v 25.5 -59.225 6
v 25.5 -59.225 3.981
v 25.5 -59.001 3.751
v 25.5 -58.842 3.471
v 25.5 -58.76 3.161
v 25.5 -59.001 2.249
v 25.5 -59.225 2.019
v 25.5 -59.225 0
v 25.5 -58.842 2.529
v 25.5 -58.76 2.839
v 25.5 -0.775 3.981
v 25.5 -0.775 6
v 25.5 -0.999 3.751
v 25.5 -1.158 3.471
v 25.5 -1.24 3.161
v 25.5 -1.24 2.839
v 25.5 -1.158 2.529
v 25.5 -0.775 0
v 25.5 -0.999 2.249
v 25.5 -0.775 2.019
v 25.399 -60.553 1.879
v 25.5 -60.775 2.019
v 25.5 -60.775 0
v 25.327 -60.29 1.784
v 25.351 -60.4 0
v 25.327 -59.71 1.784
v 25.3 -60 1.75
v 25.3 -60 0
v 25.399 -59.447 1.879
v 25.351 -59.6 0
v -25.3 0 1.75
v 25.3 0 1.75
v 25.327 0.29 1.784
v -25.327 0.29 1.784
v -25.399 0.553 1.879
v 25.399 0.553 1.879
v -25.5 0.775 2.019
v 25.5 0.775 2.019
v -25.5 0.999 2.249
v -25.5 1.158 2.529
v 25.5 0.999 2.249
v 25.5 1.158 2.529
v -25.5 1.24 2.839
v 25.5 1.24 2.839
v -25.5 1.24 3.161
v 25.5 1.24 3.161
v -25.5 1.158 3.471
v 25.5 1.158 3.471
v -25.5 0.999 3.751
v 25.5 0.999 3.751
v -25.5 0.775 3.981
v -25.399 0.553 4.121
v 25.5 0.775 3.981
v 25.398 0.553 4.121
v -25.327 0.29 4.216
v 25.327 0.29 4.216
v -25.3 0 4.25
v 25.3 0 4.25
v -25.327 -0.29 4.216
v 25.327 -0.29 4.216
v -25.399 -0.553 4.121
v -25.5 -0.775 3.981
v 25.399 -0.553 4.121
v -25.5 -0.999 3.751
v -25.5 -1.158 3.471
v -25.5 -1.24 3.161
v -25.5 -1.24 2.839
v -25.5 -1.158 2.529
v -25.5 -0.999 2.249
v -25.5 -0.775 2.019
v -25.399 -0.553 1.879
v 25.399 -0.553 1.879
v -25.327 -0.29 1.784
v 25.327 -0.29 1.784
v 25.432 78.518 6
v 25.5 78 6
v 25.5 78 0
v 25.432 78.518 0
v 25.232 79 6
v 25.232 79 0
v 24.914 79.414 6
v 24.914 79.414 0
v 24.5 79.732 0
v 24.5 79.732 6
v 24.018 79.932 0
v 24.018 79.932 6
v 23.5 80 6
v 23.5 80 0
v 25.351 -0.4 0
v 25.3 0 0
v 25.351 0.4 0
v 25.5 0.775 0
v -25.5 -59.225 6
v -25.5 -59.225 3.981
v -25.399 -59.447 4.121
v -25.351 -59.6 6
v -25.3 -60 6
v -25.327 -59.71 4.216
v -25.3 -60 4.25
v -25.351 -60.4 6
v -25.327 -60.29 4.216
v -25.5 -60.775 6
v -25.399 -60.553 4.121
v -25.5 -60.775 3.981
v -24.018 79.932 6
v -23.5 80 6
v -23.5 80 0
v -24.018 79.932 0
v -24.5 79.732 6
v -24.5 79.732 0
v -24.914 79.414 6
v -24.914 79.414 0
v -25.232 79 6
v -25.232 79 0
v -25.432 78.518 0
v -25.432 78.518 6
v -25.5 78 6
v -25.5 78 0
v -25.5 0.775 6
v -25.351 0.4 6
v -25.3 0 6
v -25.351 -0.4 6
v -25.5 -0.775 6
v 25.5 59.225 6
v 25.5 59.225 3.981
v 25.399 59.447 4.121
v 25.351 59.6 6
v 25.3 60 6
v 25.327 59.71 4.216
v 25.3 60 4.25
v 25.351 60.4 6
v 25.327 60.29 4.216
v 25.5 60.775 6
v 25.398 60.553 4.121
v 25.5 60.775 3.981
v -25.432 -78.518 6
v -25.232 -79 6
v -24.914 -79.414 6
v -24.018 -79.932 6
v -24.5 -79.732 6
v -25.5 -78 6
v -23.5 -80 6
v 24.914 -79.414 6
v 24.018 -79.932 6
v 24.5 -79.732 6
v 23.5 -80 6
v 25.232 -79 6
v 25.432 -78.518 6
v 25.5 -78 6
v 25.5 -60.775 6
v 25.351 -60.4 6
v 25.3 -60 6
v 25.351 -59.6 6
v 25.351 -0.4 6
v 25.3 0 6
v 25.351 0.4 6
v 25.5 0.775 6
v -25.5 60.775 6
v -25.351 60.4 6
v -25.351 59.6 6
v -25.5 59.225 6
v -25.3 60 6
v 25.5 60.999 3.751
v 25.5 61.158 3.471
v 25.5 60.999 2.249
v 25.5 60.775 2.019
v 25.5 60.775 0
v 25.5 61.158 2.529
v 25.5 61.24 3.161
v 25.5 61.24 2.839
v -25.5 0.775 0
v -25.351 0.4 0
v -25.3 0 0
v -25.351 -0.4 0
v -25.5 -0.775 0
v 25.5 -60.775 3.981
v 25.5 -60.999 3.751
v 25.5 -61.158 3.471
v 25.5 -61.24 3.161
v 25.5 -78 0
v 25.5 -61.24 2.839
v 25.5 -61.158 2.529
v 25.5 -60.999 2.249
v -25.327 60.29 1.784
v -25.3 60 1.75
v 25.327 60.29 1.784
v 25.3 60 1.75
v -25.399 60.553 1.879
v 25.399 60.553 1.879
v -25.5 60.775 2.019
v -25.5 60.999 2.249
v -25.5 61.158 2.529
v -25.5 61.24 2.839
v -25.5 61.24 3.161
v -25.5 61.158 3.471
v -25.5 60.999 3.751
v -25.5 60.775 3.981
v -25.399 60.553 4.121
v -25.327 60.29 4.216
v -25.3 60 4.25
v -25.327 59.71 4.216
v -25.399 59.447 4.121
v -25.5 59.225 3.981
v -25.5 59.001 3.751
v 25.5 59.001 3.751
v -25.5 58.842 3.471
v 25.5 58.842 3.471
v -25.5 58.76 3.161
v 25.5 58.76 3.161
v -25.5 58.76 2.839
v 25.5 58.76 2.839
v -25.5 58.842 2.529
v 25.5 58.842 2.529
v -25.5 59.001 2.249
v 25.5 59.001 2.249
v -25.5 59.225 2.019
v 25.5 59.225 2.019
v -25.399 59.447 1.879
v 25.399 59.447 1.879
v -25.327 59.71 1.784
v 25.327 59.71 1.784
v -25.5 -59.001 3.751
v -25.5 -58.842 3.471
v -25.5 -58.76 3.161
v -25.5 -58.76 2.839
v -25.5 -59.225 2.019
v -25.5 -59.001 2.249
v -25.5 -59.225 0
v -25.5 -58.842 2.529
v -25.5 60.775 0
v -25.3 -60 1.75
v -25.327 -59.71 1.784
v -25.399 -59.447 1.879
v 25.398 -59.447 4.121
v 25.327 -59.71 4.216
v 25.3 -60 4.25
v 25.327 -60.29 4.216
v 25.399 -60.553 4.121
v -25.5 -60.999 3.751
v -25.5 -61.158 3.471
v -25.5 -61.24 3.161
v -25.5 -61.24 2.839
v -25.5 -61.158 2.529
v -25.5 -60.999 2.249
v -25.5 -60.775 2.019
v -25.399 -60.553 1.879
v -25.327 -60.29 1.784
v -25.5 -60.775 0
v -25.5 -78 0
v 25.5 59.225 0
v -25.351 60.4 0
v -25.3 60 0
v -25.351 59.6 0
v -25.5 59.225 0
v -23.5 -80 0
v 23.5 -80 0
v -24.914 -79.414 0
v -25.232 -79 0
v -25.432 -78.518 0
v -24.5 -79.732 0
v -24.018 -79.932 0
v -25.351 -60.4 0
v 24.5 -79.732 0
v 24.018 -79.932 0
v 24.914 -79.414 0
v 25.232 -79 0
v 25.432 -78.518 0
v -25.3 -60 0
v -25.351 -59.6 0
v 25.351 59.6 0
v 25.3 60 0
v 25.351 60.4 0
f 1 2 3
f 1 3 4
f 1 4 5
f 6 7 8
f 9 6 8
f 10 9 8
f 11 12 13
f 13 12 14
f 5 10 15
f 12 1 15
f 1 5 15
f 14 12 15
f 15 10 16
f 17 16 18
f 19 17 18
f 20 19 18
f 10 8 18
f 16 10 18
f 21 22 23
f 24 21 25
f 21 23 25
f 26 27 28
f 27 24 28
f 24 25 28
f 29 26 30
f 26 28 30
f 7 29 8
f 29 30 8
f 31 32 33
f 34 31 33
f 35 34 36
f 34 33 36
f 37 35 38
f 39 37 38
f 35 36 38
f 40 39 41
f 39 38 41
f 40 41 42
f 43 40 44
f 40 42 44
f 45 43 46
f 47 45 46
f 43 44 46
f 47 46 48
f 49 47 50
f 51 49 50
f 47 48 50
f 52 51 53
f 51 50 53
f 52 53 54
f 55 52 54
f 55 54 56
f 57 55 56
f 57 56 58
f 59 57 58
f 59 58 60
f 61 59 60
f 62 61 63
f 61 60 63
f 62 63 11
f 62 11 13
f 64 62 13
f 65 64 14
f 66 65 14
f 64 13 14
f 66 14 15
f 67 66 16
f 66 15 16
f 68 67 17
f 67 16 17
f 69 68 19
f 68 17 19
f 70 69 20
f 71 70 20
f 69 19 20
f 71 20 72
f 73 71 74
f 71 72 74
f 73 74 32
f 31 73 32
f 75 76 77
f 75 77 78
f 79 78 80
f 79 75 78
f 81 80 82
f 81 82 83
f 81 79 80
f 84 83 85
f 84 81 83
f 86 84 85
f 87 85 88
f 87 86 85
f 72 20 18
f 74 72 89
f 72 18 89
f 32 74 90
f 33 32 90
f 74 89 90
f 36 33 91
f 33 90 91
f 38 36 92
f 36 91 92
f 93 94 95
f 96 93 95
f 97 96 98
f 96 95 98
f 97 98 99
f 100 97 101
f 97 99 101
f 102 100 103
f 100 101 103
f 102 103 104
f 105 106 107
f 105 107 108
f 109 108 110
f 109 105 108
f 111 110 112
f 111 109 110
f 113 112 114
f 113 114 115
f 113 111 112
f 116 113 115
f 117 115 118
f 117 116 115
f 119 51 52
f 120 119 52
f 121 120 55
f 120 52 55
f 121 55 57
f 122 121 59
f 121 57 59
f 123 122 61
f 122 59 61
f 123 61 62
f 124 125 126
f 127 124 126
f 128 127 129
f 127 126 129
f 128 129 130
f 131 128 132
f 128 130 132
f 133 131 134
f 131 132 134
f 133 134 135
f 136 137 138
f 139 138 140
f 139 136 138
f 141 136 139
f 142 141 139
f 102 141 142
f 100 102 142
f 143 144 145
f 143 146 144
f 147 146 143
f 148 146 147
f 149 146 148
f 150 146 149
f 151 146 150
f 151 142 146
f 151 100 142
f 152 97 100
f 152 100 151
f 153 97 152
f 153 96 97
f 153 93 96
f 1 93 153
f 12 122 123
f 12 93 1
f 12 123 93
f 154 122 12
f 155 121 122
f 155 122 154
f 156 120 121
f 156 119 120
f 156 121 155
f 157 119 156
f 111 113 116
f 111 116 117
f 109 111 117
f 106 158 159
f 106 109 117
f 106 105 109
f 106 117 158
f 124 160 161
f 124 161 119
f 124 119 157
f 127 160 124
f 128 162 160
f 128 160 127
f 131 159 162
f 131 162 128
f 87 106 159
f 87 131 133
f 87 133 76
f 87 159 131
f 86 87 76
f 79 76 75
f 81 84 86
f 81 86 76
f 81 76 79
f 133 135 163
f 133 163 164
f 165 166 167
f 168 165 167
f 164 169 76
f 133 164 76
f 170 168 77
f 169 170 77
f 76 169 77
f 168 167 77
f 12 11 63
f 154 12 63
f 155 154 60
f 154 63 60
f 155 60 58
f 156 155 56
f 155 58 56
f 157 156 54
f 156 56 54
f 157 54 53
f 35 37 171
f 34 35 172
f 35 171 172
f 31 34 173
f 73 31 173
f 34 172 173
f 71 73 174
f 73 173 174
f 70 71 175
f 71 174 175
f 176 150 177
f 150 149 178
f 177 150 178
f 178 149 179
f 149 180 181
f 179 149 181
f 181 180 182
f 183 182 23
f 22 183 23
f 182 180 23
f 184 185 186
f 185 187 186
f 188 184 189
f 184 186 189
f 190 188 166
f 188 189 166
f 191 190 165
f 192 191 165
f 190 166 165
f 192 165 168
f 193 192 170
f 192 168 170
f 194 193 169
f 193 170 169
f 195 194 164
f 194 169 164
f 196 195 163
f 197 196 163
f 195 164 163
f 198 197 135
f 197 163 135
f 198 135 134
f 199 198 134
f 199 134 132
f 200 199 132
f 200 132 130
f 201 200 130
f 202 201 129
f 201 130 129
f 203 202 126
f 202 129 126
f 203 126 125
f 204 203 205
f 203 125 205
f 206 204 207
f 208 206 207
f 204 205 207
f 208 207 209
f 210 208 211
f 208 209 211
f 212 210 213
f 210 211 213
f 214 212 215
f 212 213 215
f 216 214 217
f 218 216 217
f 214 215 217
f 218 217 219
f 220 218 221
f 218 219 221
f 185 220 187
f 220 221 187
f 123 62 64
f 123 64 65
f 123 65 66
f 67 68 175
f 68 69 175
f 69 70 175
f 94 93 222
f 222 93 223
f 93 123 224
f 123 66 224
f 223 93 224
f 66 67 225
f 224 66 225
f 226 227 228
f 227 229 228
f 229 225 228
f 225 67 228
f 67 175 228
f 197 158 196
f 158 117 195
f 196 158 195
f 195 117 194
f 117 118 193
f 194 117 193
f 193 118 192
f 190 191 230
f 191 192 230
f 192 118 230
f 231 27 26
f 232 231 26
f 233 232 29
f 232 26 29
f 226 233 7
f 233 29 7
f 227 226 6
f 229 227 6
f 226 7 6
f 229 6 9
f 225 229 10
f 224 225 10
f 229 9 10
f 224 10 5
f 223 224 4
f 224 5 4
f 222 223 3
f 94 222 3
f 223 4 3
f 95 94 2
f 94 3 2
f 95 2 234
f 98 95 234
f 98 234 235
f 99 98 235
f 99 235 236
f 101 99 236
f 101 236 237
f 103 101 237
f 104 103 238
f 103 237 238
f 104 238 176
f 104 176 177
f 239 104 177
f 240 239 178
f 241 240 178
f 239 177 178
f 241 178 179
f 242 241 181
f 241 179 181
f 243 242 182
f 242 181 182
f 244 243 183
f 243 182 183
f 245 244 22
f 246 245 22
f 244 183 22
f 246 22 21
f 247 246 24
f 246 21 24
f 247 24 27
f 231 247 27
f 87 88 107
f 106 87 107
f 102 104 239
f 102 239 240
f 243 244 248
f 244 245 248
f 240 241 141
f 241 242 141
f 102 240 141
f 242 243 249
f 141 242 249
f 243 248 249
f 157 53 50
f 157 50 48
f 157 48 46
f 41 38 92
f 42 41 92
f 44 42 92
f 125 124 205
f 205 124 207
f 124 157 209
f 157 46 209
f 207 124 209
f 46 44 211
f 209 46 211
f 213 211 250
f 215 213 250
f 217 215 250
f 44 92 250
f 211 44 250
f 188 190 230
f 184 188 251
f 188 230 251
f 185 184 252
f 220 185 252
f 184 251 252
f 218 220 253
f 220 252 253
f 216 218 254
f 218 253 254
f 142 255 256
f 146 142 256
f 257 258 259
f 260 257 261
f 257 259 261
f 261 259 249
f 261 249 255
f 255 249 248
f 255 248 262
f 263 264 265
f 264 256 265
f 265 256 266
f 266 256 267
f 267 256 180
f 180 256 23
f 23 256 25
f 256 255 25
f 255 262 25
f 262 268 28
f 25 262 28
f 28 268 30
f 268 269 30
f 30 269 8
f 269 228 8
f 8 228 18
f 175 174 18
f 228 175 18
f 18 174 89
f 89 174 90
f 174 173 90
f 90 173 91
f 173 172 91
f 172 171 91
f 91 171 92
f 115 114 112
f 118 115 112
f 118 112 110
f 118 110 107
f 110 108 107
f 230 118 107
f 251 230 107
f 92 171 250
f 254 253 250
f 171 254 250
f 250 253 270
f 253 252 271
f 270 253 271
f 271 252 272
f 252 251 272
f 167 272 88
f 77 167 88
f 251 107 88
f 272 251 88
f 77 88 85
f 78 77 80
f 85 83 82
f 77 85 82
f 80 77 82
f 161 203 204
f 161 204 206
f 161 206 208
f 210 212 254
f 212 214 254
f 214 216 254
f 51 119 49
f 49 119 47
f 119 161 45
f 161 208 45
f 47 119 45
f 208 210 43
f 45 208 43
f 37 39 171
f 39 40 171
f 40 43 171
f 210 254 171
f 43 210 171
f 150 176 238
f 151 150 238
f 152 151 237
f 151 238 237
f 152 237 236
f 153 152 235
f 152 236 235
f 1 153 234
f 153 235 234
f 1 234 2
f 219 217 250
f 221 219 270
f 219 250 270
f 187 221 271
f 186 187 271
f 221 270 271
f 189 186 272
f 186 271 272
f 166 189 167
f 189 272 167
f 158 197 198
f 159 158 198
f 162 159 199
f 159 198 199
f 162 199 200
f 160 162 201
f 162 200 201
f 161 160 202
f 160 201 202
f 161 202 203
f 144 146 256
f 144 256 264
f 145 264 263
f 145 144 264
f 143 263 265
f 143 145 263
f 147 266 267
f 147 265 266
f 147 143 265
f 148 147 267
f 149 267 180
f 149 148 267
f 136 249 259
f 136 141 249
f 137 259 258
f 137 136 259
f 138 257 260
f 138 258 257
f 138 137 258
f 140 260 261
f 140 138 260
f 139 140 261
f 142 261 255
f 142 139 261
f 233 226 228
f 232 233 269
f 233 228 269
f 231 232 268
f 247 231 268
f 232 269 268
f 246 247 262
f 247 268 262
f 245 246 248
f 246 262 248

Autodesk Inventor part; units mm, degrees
ref_plane "YZ Plane" through (0, 0, 0) normal (1, 0, 0) x (0, 1, 0)
ref_plane "XZ Plane" through (0, 0, 0) normal (0, 1, 0) x (-1, 0, 0)
ref_plane "XY Plane" through (0, 0, 0) normal (0, 0, 1) x (1, 0, 0)
sketch "スケッチ1" plane through (0, 0, 0) normal (0, 0, 1) x (1, 0, 0)
  line L0 (25.5, 80) -> (-25.5, 80)
  line L1 (-25.5, 80) -> (-25.5, 60.7746)
  line L2 (-25.5, -80) -> (25.5, -80)
  line L3 (25.5, -80) -> (25.5, -60.7746)
  line L4 (25.5, 80) -> (-25.5, -80) construction
  line L5 (-25.5, 80) -> (25.5, -80) construction
  arc A0 (-25.5, 0.7746) -> (-25.5, -0.7746) centre (-26.9, 0) ccw construction
  arc A1 (-25.5, 60.7746) -> (-25.5, 59.2254) centre (-26.9, 60) ccw construction
  arc A2 (-25.5, -59.2254) -> (-25.5, -60.7746) centre (-26.9, -60) ccw construction
  arc A3 (25.5, 0.7746) -> (25.5, -0.7746) centre (26.9, 0) ccw
  arc A4 (25.5, 60.7746) -> (25.5, 59.2254) centre (26.9, 60) ccw
  arc A5 (25.5, -60.7746) -> (25.5, -59.2254) centre (26.9, -60) ccw construction
  arc A6 (-25.5, 59.2254) -> (-25.5, 60.7746) centre (-26.9, 60) ccw
  line L6 (-25.5, 60.7746) -> (-25.5, 59.2254) construction
  line L7 (-25.5, 59.2254) -> (-25.5, 0.7746)
  arc A7 (-25.5, -0.7746) -> (-25.5, 0.7746) centre (-26.9, 0) ccw
  line L8 (-25.5, -0.7746) -> (-25.5, -59.2254)
  line L9 (-25.5, 0.7746) -> (-25.5, -0.7746) construction
  line L10 (-25.5, -59.2254) -> (-25.5, -60.7746) construction
  line L11 (-25.5, -60.7746) -> (-25.5, -80)
  arc A8 (-25.5, -60.7746) -> (-25.5, -59.2254) centre (-26.9, -60) ccw
  arc A9 (25.5, -59.2254) -> (25.5, -60.7746) centre (26.9, -60) ccw
  line L12 (25.5, -60.7746) -> (25.5, -59.2254) construction
  line L13 (25.5, -59.2254) -> (25.5, -0.7746)
  arc A10 (25.5, -0.7746) -> (25.5, 0.7746) centre (26.9, 0) ccw construction
  line L14 (25.5, -0.7746) -> (25.5, 0.7746) construction
  line L15 (25.5, 0.7746) -> (25.5, 59.2254)
  arc A11 (25.5, 59.2254) -> (25.5, 60.7746) centre (26.9, 60) ccw construction
  line L16 (25.5, 59.2254) -> (25.5, 60.7746) construction
  line L17 (25.5, 60.7746) -> (25.5, 80)
  point P0 (0, 0)
  point P1 (0, 0)
  point P2 (0, 0)
  dimension "d0" = 51
  dimension "d1" = 160
  dimension "d2" = 3.2
  dimension "d3" = 3.2
  dimension "d4" = 3.2
  dimension "d5" = 60
  dimension "d6" = 60
  dimension "d7" = 3.2
  dimension "d8" = 3.2
  dimension "d9" = 3.2
  dimension "d10" = 60
  dimension "d11" = 60
  dimension "d12" = 1.4
  dimension "d13" = 1.4
extrude "押し出し1" add sketch "スケッチ1" along normal blind 6
sketch "スケッチ2" plane through (25.5, 0.7746, 0) normal (1, 0, 0) x (0, 0, -1)
  circle A0 centre (-3, -0.7746) radius 1.25
  circle A1 centre (-3, 59.2254) radius 1.25
  circle A2 centre (-3, -60.7746) radius 1.25
  point P0 (0, -0.7746)
  dimension "d16" = 2.5
  dimension "d17" = 2.5
  dimension "d18" = 2.5
  dimension "d19" = 60
  dimension "d20" = 60
  dimension "d21" = 3
extrude "押し出し2" cut sketch "スケッチ2" against normal through all
fillet "フィレット1" radius 2 4 edges at (25.5, 80, 3) (-25.5, 80, 3) (25.5, -80, 3) (-25.5, -80, 3)
properties part number "関節3_上板" material "ポリカーボネート、スモーク"
